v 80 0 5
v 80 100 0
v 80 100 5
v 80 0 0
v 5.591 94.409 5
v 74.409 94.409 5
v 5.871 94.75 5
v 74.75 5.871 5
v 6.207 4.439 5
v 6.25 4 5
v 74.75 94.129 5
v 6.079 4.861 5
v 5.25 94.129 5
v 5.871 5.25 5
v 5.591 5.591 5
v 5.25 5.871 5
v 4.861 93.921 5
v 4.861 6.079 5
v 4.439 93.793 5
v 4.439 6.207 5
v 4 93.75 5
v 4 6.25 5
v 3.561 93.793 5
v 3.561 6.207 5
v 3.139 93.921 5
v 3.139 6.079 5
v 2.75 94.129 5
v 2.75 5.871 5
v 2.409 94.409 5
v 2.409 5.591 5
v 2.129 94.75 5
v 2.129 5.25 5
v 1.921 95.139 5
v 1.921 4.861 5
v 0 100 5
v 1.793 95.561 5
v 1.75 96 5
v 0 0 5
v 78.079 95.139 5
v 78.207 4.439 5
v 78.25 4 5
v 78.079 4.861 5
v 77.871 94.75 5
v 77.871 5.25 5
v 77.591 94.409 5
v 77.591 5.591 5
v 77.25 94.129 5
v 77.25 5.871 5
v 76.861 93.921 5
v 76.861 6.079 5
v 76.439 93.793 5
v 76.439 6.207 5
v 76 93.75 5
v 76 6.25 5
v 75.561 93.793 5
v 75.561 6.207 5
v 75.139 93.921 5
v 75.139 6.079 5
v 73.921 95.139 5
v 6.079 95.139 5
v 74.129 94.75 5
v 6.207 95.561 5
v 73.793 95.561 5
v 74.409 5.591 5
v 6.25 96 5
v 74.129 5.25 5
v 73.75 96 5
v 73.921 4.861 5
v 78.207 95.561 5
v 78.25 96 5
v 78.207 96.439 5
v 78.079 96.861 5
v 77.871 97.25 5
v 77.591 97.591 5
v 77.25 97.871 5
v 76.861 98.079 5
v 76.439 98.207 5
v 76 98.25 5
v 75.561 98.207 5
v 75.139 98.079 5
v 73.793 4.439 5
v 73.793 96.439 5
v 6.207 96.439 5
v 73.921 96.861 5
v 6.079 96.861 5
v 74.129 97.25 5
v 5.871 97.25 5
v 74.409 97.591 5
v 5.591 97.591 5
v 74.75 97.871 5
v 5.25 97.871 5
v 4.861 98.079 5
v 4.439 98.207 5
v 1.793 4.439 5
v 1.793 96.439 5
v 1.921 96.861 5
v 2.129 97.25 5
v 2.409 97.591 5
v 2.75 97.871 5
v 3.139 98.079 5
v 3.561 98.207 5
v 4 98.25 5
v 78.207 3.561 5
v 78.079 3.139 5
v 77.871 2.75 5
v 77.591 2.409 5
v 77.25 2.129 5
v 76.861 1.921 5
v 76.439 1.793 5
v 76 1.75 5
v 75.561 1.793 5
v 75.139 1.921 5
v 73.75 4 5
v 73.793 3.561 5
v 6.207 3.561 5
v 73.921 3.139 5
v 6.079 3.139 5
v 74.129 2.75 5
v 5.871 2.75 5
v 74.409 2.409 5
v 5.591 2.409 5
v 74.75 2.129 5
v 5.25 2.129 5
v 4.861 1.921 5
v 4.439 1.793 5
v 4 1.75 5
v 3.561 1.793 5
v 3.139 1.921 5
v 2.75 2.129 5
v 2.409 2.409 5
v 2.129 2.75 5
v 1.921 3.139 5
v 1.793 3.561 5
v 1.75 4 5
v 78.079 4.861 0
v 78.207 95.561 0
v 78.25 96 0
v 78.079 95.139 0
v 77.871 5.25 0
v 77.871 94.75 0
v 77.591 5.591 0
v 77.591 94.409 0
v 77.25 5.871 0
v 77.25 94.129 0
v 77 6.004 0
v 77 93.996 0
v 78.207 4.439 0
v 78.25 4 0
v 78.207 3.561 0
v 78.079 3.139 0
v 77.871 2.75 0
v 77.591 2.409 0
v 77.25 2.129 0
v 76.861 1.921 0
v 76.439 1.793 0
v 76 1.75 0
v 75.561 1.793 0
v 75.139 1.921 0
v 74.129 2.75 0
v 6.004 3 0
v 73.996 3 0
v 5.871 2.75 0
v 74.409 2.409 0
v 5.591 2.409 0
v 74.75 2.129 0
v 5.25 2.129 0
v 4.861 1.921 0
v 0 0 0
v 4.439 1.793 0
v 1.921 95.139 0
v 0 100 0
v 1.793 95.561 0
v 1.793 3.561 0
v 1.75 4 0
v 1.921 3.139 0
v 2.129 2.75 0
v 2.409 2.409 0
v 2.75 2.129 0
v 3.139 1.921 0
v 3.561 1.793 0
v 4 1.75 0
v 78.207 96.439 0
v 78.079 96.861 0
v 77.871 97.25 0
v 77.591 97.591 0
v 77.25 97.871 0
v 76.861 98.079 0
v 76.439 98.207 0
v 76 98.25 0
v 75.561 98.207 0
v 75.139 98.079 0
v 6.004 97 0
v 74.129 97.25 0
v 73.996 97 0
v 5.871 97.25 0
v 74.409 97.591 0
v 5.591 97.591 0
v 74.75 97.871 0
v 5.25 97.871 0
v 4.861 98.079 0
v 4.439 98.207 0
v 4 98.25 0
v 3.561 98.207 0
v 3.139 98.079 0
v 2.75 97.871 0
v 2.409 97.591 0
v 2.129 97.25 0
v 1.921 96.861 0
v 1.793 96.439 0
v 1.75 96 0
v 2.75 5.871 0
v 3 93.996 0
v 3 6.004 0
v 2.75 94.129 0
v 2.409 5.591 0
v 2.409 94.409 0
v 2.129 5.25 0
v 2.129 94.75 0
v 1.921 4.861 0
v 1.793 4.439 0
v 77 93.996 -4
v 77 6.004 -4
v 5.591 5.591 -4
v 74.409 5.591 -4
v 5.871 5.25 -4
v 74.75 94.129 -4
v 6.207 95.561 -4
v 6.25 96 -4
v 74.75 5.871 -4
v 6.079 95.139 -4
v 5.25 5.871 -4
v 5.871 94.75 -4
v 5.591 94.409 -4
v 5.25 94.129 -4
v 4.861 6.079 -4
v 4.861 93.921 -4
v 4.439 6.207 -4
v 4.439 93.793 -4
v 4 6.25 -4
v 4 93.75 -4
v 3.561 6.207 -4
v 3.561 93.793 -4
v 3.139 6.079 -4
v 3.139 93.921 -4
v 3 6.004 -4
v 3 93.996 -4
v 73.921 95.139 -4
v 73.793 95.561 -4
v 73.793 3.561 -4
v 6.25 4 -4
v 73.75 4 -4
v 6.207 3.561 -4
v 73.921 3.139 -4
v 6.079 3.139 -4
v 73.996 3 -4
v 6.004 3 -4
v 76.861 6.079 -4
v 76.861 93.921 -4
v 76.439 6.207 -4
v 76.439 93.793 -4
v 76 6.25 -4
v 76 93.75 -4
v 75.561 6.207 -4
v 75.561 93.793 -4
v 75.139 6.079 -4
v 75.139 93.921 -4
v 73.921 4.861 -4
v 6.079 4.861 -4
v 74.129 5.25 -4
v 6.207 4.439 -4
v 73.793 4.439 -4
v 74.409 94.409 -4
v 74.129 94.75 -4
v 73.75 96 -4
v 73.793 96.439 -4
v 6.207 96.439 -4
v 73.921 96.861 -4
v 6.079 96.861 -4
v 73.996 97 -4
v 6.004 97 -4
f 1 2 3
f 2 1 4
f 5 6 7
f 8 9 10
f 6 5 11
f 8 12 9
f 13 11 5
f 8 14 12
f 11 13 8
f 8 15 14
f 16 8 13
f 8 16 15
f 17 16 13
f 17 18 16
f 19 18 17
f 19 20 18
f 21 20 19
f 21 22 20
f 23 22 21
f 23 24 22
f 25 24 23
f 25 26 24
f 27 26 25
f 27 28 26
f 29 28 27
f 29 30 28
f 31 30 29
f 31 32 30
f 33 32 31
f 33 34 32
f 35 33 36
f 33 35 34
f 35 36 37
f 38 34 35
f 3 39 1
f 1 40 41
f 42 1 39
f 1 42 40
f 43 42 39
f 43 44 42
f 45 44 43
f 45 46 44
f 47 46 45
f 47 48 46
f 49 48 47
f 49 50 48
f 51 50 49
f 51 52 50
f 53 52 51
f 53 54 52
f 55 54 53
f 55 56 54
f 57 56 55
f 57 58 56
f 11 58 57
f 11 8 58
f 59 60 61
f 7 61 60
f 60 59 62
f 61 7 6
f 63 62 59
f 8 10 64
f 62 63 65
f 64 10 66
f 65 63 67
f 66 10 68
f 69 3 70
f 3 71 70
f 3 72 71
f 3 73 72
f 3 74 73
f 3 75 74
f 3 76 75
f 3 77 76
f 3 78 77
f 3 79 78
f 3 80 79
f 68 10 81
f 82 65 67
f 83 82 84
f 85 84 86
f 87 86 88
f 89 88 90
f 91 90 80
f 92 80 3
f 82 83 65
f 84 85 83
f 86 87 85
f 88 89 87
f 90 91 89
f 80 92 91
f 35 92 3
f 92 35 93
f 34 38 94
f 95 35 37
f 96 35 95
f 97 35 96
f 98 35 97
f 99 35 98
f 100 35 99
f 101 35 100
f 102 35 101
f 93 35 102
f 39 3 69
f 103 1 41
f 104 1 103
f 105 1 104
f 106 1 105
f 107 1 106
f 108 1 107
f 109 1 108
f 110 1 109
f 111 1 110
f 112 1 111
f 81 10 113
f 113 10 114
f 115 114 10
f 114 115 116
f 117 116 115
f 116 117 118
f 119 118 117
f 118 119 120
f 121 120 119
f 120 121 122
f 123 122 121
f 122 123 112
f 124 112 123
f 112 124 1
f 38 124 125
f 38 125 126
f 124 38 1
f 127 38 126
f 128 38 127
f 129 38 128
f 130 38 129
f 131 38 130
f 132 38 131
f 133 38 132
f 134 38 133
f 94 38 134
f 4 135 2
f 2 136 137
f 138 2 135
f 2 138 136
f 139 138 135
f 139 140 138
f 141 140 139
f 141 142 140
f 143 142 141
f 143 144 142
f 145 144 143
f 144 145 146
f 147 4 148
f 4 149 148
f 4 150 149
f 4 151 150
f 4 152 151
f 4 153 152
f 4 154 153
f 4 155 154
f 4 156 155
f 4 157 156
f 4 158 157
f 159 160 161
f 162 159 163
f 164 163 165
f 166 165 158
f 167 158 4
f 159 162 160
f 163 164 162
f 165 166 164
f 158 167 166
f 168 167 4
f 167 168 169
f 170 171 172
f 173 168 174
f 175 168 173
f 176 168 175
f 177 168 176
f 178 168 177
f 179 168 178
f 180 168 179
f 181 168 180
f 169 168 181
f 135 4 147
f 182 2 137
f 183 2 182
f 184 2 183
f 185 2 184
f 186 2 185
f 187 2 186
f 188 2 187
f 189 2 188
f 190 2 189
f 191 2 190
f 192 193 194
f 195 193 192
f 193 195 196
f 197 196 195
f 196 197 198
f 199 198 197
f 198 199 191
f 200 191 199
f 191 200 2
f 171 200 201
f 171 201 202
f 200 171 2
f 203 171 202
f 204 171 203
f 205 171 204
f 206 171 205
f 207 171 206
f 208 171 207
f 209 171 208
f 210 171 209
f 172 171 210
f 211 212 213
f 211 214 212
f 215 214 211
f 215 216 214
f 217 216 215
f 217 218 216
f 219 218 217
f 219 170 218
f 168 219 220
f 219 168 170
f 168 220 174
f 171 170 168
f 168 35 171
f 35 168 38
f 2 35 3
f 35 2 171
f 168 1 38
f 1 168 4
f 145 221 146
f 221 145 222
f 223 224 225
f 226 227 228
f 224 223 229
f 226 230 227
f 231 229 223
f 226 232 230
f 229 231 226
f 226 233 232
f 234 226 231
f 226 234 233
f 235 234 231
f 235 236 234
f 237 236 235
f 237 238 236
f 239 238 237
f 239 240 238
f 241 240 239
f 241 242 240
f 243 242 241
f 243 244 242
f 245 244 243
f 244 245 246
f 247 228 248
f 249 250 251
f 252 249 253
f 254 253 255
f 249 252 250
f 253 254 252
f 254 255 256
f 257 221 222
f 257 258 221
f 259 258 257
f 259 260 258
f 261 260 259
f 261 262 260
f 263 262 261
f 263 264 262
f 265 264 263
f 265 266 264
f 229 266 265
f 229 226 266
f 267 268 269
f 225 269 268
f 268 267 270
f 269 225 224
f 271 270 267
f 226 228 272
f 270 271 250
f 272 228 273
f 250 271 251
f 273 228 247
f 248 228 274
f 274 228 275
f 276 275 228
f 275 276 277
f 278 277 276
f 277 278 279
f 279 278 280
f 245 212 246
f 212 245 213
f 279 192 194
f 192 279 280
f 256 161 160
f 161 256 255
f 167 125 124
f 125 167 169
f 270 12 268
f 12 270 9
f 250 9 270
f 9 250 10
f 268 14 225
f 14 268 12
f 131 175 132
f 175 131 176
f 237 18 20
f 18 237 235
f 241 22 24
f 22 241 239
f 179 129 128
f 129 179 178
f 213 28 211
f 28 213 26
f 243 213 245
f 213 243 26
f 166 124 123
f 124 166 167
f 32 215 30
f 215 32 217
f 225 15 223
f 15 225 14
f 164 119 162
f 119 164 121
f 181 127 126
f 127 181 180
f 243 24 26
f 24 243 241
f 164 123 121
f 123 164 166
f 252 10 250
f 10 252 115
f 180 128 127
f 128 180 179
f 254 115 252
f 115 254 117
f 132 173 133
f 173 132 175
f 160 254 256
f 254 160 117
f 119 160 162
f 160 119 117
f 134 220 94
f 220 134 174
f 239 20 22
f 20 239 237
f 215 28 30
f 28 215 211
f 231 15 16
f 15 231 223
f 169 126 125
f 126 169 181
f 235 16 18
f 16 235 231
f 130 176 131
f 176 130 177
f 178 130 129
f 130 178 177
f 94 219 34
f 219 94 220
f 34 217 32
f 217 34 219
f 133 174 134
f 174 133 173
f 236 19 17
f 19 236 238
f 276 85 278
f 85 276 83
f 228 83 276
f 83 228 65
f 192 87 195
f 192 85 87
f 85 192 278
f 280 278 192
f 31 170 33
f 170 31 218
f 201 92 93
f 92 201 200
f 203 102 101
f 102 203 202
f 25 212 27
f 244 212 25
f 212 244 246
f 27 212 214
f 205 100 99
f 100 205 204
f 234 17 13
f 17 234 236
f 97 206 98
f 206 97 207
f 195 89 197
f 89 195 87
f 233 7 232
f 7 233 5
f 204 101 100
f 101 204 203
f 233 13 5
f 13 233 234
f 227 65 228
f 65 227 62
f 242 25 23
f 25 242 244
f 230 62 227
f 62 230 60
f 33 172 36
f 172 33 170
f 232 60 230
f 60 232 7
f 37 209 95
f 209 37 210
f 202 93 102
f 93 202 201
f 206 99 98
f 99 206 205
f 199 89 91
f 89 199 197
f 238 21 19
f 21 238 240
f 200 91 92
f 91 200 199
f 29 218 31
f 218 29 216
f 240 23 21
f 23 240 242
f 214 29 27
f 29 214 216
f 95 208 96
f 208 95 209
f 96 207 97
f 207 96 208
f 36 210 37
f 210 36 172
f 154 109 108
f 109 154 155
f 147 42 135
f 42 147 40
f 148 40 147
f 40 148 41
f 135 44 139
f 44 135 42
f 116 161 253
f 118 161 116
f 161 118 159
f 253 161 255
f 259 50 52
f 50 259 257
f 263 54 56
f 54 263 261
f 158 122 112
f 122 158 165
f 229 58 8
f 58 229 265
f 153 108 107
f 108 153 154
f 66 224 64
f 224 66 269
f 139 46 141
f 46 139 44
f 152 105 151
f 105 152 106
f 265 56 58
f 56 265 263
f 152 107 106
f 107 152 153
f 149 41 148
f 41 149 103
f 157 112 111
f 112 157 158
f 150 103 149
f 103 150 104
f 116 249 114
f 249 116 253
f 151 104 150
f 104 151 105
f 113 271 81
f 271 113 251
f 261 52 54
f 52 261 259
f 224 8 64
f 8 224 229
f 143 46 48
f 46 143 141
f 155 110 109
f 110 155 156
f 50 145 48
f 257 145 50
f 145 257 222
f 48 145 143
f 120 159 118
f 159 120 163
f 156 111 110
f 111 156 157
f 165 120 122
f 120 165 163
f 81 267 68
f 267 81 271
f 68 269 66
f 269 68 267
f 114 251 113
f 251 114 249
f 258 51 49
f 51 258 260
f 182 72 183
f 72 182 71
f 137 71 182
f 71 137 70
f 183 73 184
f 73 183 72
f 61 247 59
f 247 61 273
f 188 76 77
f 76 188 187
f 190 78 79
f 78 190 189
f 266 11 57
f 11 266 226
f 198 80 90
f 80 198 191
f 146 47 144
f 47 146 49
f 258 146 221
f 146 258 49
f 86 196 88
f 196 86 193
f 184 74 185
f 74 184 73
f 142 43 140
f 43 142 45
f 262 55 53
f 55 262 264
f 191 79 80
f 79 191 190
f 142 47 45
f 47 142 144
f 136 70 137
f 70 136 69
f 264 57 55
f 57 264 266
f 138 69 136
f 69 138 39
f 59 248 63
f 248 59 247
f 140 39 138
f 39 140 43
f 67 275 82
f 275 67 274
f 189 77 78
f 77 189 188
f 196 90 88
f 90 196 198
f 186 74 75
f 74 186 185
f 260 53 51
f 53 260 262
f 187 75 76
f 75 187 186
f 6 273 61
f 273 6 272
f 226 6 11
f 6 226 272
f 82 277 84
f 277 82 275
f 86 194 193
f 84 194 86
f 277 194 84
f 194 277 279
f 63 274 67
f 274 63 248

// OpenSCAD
$fn = 32;

// ----------------------------------------------------------------------
// Enclosure lid: 80 x 100 x 5 mm, 4 bolt holes
// ----------------------------------------------------------------------

// --- parameters (mm) ---
length = 80;              // lid length, X
width = 100;              // lid width, Y
plate_t = 5;              // lid plate thickness
bolt_d = 4.5;             // bolt clearance
boss_lip = 4;             // bolt hole inset from the corner
sink = 1;                 // overlap of the lip and ribs into the plate
lip_h = 5;                // lip height below the plate
lip_wall = 3;             // lip wall thickness

module plate() {
  cube([length, width, plate_t]);
  /* lip that drops into the housing opening, sunk into the plate */
  translate([lip_wall, lip_wall, -lip_h + sink]) cube([length - 2 * lip_wall, width - 2 * lip_wall, lip_h]);
}

difference() {
  plate();
  /* bolt pattern matching the corner bosses */
  for (sx = [0, 1]) for (sy = [0, 1])
    translate([sx * (length - 2 * boss_lip) + boss_lip, sy * (width - 2 * boss_lip) + boss_lip, -lip_h - 1])
      cylinder(h = plate_t + lip_h + 2, d = bolt_d);
}
